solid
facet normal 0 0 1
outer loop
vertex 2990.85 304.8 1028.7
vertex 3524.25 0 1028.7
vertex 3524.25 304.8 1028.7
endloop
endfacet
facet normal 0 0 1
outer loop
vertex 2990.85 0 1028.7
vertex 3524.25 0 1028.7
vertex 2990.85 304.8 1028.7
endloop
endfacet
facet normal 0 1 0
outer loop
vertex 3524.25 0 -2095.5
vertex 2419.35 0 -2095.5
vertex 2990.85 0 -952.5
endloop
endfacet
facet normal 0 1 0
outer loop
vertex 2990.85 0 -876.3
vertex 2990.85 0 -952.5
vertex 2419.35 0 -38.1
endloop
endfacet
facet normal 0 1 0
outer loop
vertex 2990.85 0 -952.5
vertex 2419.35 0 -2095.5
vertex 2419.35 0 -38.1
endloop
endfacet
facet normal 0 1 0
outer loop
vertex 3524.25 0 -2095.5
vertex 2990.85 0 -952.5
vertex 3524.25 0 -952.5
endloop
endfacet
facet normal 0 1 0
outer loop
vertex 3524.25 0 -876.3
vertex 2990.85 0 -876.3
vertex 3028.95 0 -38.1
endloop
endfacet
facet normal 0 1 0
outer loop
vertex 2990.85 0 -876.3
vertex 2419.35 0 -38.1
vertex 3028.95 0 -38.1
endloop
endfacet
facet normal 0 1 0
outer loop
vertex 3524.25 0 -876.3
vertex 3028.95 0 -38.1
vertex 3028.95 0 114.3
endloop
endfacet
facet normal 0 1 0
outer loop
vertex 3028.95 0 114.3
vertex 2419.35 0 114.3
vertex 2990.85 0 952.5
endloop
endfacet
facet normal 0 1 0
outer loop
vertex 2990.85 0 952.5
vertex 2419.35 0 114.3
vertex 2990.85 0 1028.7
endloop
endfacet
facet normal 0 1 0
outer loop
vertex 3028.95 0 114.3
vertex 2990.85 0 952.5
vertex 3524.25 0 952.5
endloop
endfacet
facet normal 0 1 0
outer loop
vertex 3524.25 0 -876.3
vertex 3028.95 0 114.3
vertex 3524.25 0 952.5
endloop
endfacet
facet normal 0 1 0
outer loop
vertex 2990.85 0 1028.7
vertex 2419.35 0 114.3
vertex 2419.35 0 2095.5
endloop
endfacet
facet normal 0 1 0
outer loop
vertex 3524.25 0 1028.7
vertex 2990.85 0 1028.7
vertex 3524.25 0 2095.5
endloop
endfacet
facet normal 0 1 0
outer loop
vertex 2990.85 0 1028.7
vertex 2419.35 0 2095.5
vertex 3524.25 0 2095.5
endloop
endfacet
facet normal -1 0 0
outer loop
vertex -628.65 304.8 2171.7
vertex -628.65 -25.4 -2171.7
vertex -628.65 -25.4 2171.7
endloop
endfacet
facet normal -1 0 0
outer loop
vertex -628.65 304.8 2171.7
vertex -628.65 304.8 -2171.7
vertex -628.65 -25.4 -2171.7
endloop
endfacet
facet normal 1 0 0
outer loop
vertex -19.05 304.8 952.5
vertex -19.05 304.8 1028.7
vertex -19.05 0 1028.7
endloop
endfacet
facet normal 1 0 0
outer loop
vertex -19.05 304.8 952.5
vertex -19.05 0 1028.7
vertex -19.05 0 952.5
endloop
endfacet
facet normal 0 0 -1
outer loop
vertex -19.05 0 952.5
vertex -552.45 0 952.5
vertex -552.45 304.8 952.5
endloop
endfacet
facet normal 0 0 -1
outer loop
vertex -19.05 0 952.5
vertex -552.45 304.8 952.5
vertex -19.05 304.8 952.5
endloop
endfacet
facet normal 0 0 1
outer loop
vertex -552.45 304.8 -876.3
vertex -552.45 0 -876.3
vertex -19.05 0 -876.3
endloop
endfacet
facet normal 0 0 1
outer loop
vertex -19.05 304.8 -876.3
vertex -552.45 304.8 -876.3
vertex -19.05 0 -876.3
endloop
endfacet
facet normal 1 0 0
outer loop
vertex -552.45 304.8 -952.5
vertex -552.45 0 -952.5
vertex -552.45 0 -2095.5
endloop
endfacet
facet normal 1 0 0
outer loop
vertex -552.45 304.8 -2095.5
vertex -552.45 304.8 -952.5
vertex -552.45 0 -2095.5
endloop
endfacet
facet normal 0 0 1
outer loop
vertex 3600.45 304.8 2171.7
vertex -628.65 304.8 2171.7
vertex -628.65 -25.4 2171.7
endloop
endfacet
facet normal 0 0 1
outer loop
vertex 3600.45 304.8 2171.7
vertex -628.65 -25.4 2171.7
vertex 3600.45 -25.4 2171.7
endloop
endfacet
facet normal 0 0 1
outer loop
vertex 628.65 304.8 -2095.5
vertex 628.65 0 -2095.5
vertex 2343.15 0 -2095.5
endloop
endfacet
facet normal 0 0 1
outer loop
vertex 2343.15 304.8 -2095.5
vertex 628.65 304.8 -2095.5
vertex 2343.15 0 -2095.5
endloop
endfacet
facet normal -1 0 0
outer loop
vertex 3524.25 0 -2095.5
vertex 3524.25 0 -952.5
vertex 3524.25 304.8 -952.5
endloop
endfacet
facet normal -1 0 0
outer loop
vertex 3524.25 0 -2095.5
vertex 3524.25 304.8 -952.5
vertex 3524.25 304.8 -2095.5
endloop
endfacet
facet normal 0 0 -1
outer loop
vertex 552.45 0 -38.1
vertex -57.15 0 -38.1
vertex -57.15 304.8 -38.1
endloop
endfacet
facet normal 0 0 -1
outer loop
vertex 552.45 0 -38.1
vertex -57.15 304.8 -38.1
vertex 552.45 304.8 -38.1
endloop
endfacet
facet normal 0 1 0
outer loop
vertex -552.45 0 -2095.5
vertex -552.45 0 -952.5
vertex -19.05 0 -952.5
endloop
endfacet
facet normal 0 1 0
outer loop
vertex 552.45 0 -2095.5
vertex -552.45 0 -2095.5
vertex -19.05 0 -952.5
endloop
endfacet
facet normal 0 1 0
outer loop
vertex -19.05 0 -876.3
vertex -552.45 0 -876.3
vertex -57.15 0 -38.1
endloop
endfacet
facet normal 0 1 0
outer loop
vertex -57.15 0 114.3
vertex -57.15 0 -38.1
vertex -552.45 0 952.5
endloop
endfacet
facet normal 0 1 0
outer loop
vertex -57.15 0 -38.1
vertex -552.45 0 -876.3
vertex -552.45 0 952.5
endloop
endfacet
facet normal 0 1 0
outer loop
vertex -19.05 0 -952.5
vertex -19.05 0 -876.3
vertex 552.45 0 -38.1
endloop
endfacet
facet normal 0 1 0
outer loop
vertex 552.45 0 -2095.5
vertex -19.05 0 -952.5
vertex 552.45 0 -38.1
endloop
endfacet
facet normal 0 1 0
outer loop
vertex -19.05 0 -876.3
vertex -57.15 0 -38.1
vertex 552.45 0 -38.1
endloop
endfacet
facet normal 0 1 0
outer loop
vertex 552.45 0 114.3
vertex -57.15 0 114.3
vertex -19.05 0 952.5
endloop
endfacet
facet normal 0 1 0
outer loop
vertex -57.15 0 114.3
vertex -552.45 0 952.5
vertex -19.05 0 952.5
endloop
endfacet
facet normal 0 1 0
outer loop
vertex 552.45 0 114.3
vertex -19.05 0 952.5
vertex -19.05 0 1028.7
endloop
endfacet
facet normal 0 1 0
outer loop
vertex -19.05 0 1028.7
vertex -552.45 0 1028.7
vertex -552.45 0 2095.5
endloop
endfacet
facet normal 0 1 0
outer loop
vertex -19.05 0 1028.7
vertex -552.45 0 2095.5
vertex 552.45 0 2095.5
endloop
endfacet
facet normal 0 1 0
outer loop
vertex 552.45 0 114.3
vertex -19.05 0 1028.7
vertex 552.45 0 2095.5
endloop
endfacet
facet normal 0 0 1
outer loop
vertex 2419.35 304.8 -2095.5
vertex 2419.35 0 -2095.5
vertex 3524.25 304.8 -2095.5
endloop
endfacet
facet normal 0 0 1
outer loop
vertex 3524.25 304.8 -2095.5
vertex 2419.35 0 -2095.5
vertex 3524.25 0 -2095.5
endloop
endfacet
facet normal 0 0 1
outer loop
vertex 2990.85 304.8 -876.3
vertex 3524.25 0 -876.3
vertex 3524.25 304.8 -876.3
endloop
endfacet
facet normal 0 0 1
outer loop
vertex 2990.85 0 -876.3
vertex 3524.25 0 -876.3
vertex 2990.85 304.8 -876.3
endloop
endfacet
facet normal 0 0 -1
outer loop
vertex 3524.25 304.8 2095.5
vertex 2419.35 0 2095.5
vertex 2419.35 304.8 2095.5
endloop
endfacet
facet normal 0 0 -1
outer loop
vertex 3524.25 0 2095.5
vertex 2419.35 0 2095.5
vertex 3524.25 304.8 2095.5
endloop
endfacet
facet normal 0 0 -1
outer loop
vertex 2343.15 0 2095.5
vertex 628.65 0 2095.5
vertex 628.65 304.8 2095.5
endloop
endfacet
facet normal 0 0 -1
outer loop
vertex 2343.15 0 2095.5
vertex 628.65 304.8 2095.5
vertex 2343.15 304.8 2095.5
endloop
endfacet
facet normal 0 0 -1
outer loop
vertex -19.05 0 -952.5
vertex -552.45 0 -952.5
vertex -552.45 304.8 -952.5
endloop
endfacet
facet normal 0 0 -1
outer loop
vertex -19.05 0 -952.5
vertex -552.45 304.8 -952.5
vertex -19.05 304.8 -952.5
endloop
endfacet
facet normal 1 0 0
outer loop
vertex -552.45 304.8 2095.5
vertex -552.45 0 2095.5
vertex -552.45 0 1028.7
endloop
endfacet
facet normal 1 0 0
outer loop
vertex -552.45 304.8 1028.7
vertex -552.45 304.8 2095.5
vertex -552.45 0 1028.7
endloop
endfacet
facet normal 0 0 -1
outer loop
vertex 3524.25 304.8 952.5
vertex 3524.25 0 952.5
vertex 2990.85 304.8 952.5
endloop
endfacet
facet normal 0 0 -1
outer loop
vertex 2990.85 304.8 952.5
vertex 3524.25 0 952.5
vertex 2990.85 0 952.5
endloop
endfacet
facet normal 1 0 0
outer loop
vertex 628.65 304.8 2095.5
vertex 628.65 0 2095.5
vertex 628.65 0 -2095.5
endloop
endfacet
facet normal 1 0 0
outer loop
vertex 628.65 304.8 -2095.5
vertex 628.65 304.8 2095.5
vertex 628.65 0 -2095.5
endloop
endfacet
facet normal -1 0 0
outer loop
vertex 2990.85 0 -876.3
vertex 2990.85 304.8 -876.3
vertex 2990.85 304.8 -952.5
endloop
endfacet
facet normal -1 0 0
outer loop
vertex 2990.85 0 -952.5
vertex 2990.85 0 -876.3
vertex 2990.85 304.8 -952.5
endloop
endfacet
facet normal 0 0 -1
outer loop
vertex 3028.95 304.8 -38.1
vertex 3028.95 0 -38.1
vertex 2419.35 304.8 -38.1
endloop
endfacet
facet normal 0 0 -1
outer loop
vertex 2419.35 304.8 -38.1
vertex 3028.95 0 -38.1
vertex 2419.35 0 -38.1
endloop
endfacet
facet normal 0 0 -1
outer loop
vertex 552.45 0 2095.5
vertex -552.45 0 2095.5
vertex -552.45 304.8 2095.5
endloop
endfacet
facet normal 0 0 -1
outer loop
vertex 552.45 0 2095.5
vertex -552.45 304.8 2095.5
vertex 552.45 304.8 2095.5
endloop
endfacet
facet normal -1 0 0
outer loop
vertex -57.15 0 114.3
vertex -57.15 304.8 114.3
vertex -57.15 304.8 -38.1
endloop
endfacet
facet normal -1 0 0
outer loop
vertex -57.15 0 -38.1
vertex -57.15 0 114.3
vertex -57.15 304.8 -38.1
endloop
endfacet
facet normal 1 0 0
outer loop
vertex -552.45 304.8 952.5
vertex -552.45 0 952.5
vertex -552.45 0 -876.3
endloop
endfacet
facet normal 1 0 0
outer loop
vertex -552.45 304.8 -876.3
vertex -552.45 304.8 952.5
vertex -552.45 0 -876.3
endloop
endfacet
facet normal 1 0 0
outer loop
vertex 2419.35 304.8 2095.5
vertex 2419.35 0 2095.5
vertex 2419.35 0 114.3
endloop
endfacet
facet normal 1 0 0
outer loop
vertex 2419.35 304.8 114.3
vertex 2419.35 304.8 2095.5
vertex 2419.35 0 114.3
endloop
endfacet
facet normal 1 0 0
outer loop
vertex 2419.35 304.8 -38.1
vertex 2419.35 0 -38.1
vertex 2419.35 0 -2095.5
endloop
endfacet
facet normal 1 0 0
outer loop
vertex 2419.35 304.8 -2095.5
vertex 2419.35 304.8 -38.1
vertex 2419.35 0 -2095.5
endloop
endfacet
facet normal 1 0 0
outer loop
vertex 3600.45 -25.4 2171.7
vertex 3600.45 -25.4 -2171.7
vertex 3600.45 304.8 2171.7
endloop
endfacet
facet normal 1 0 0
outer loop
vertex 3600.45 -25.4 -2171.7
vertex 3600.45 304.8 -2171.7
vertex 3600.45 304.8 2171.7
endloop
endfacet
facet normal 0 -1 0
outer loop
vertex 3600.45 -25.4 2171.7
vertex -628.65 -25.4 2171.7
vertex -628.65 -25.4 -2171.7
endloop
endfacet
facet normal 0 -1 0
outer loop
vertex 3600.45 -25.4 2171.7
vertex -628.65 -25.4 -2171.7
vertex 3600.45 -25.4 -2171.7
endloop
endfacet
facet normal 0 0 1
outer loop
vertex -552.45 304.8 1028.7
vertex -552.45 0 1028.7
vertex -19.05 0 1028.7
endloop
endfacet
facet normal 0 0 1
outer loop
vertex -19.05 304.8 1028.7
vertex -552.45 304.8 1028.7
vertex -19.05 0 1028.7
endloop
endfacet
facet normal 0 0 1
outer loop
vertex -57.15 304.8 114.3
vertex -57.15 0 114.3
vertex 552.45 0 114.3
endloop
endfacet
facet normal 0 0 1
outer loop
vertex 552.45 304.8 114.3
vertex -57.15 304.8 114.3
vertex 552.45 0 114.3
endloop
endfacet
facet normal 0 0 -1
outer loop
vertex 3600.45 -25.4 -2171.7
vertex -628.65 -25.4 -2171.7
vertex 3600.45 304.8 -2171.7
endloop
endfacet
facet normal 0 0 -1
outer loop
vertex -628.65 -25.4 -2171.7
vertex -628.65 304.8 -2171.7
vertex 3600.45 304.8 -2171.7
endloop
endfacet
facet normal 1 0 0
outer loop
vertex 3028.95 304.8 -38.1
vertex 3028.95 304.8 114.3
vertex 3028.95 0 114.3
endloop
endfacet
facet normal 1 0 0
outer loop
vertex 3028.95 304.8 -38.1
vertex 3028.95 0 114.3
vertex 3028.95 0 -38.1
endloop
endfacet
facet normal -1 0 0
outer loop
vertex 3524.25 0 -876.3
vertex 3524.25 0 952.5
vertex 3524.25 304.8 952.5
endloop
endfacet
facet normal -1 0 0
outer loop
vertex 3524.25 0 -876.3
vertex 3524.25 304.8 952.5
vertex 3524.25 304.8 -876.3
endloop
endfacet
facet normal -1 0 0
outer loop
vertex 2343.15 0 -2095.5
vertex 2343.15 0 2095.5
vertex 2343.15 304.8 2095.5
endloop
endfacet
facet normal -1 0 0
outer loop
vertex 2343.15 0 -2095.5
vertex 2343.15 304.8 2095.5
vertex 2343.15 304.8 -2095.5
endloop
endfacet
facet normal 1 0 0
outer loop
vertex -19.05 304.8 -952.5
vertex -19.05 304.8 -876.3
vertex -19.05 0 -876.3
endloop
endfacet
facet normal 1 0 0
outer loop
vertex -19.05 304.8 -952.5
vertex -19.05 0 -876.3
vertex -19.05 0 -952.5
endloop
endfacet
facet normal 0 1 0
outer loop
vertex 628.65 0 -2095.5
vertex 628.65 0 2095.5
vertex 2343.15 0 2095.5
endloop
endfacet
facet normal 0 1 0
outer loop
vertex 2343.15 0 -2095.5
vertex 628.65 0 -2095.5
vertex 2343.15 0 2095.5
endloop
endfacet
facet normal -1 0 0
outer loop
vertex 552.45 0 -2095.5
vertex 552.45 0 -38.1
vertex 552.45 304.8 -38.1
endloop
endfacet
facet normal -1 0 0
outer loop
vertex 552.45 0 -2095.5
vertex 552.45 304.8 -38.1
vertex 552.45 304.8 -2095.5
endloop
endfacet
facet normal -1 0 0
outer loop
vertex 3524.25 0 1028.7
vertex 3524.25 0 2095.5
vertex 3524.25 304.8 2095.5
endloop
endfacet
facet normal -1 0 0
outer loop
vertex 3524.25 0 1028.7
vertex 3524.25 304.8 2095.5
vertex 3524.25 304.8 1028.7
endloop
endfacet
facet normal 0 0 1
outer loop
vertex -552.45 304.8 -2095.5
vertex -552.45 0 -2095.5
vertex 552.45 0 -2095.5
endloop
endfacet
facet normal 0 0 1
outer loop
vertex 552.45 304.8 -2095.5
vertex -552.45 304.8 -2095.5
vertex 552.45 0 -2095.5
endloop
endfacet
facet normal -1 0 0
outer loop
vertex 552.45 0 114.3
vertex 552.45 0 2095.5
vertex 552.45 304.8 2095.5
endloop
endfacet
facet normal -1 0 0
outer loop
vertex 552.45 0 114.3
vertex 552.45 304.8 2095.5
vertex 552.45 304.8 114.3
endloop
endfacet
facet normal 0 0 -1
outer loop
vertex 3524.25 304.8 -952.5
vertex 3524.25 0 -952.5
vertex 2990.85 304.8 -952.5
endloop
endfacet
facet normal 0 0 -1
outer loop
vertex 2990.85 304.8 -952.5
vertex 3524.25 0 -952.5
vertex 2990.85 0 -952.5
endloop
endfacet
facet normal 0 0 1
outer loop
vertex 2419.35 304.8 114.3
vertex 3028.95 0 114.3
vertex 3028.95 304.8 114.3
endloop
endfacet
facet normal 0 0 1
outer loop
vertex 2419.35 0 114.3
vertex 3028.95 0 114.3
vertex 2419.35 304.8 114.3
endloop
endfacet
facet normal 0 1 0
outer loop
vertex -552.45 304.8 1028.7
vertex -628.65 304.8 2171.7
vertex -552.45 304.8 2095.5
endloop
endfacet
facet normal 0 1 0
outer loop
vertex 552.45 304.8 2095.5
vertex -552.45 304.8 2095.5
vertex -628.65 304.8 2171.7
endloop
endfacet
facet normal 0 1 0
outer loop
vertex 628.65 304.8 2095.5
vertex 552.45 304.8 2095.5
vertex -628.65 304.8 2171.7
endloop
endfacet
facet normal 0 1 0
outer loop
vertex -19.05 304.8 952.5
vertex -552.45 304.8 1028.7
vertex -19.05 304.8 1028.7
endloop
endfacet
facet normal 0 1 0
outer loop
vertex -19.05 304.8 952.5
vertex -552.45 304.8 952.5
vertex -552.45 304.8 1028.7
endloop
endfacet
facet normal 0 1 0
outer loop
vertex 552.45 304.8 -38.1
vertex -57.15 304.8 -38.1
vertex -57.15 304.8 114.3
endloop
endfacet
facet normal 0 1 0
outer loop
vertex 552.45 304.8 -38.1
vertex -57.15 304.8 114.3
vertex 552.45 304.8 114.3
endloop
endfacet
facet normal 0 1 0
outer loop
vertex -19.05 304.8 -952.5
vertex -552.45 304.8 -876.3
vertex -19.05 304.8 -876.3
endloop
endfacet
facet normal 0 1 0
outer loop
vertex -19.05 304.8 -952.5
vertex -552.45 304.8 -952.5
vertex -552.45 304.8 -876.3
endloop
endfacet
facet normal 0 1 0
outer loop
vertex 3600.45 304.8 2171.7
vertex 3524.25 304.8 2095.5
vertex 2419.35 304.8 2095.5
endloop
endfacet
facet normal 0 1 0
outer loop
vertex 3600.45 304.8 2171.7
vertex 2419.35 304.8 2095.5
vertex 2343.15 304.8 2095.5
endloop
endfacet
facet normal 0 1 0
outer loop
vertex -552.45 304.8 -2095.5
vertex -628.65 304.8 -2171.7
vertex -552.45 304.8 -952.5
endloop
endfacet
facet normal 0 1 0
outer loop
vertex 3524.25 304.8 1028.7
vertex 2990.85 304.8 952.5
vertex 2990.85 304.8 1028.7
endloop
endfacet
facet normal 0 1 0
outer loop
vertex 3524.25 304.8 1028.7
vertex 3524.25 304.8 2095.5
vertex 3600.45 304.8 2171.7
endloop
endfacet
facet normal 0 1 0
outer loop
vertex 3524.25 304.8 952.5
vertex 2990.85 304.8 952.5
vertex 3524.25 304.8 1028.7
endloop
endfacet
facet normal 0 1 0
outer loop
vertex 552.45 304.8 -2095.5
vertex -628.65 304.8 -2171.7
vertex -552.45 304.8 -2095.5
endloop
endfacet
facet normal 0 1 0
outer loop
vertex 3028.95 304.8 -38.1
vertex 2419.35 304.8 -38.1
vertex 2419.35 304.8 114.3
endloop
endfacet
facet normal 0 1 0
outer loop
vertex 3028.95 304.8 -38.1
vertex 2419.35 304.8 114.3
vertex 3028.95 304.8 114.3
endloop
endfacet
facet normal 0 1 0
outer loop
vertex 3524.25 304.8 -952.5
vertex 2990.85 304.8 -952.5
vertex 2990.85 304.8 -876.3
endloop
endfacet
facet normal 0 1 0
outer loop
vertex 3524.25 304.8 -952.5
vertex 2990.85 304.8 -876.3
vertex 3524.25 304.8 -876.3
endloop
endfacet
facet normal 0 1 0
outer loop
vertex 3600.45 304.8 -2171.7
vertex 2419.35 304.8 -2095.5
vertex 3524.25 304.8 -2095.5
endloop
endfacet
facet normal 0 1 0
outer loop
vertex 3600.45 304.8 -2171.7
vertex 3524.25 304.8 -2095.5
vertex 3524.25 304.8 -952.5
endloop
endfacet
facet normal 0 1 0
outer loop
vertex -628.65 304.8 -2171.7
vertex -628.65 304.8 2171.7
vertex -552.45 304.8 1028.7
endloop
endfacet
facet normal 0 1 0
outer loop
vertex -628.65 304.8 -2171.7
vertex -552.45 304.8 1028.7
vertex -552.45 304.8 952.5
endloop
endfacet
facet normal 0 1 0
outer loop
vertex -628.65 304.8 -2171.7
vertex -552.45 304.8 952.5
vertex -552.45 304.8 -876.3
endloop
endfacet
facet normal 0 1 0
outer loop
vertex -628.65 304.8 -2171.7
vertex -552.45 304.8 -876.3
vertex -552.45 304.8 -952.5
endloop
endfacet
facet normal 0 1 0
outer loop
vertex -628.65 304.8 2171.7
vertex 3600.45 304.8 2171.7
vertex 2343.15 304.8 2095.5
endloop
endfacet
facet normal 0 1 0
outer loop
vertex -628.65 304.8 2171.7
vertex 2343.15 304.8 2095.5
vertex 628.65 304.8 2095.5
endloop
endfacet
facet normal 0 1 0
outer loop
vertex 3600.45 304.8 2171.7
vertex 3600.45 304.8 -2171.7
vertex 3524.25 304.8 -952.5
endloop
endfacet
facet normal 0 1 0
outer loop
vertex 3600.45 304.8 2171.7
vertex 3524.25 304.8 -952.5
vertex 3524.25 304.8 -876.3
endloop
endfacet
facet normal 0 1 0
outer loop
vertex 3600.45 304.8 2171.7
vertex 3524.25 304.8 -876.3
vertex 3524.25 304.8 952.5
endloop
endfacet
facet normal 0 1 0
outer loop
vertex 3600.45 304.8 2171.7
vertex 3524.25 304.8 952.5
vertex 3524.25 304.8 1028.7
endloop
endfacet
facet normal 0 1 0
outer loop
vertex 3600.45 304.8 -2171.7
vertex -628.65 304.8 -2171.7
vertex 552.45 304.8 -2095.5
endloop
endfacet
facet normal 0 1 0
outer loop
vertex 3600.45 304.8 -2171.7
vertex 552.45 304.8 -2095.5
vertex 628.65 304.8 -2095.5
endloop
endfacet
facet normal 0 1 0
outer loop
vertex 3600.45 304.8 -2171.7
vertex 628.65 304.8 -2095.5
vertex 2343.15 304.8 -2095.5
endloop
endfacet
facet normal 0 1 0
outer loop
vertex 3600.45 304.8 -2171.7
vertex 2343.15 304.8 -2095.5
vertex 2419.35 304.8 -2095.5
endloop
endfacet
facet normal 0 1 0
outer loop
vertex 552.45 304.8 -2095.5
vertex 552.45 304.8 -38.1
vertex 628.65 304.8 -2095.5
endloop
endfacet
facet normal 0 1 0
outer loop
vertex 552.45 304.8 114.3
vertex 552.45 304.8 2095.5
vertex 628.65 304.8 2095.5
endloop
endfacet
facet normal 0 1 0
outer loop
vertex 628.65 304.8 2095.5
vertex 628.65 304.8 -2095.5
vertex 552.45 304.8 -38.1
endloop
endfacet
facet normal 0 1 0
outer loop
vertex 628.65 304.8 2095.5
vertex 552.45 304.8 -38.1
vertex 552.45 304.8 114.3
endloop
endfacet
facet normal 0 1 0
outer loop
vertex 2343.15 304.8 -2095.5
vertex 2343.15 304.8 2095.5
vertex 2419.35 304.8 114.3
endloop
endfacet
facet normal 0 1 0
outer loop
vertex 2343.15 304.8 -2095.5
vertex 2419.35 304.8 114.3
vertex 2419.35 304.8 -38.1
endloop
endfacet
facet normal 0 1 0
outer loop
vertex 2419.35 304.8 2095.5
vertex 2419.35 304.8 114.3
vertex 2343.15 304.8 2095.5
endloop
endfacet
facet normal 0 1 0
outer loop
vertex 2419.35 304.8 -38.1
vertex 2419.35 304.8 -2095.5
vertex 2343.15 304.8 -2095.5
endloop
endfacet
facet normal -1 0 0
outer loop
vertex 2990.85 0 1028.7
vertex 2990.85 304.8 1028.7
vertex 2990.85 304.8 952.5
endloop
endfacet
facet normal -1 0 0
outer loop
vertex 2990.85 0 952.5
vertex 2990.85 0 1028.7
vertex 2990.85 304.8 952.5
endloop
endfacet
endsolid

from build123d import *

# Parameters (mm, degrees)
EXTRUDE_THIN1_OUTLINE_W   = 4229.1
EXTRUDE_THIN1_OUTLINE_H   = 4343.4
EXTRUDE_THIN1_OUTLINE_W_2 = 1104.9
EXTRUDE_THIN1_OUTLINE_H_2 = 4191
EXTRUDE_THIN1_OUTLINE_W_3 = 1714.5
EXTRUDE_THIN1_DEPTH       = 304.8
SKETCH2_W                 = 4229.1
SKETCH2_H                 = 4343.4
BOSS_EXTRUDE2_DEPTH       = 25.4
SKETCH3_W                 = 533.4
SKETCH3_H                 = 76.2
SKETCH3_W_2               = 609.6
SKETCH3_H_2               = 152.4
BOSS_EXTRUDE3_DEPTH       = 304.8


# Read off the part's stored shape, not the designer's step: Extrude-Thin1
with BuildPart() as part:
    # Extrude-Thin1 outline → Extrude-Thin1 (new body)
    with BuildSketch(Plane(origin=(0, 0, 0), x_dir=(1, 0, 0), z_dir=(0, 1, 0))):
        with Locations((1485.9, 0)):
            Rectangle(EXTRUDE_THIN1_OUTLINE_W, EXTRUDE_THIN1_OUTLINE_H)
        Rectangle(EXTRUDE_THIN1_OUTLINE_W_2, EXTRUDE_THIN1_OUTLINE_H_2, mode=Mode.SUBTRACT)
        with Locations((1485.9, 0)):
            Rectangle(EXTRUDE_THIN1_OUTLINE_W_3, EXTRUDE_THIN1_OUTLINE_H_2, mode=Mode.SUBTRACT)
        with Locations((2971.8, 0)):
            Rectangle(EXTRUDE_THIN1_OUTLINE_W_2, EXTRUDE_THIN1_OUTLINE_H_2, mode=Mode.SUBTRACT)
    extrude(amount=EXTRUDE_THIN1_DEPTH)

    # Sketch2 → Boss-Extrude2 (add)
    with BuildSketch(Plane.XZ):
        with Locations((1485.9, 0)):
            Rectangle(SKETCH2_W, SKETCH2_H)
    extrude(amount=BOSS_EXTRUDE2_DEPTH)

    # Sketch3 → Boss-Extrude3 (add)
    with BuildSketch(Plane(origin=(0, 0, 0), x_dir=(1, 0, 0), z_dir=(0, 1, 0))):
        with Locations((-285.75, -990.6)):
            Rectangle(SKETCH3_W, SKETCH3_H)
        with Locations((-285.75, 914.4)):
            Rectangle(SKETCH3_W, SKETCH3_H)
        with Locations((247.65, -38.1)):
            Rectangle(SKETCH3_W_2, SKETCH3_H_2)
    boss_extrude3 = extrude(amount=BOSS_EXTRUDE3_DEPTH)

    # Mirror1: Boss-Extrude3 across plane
    add(boss_extrude3.mirror(Plane.ZY.offset(-1485.9)))


solid = part.part
